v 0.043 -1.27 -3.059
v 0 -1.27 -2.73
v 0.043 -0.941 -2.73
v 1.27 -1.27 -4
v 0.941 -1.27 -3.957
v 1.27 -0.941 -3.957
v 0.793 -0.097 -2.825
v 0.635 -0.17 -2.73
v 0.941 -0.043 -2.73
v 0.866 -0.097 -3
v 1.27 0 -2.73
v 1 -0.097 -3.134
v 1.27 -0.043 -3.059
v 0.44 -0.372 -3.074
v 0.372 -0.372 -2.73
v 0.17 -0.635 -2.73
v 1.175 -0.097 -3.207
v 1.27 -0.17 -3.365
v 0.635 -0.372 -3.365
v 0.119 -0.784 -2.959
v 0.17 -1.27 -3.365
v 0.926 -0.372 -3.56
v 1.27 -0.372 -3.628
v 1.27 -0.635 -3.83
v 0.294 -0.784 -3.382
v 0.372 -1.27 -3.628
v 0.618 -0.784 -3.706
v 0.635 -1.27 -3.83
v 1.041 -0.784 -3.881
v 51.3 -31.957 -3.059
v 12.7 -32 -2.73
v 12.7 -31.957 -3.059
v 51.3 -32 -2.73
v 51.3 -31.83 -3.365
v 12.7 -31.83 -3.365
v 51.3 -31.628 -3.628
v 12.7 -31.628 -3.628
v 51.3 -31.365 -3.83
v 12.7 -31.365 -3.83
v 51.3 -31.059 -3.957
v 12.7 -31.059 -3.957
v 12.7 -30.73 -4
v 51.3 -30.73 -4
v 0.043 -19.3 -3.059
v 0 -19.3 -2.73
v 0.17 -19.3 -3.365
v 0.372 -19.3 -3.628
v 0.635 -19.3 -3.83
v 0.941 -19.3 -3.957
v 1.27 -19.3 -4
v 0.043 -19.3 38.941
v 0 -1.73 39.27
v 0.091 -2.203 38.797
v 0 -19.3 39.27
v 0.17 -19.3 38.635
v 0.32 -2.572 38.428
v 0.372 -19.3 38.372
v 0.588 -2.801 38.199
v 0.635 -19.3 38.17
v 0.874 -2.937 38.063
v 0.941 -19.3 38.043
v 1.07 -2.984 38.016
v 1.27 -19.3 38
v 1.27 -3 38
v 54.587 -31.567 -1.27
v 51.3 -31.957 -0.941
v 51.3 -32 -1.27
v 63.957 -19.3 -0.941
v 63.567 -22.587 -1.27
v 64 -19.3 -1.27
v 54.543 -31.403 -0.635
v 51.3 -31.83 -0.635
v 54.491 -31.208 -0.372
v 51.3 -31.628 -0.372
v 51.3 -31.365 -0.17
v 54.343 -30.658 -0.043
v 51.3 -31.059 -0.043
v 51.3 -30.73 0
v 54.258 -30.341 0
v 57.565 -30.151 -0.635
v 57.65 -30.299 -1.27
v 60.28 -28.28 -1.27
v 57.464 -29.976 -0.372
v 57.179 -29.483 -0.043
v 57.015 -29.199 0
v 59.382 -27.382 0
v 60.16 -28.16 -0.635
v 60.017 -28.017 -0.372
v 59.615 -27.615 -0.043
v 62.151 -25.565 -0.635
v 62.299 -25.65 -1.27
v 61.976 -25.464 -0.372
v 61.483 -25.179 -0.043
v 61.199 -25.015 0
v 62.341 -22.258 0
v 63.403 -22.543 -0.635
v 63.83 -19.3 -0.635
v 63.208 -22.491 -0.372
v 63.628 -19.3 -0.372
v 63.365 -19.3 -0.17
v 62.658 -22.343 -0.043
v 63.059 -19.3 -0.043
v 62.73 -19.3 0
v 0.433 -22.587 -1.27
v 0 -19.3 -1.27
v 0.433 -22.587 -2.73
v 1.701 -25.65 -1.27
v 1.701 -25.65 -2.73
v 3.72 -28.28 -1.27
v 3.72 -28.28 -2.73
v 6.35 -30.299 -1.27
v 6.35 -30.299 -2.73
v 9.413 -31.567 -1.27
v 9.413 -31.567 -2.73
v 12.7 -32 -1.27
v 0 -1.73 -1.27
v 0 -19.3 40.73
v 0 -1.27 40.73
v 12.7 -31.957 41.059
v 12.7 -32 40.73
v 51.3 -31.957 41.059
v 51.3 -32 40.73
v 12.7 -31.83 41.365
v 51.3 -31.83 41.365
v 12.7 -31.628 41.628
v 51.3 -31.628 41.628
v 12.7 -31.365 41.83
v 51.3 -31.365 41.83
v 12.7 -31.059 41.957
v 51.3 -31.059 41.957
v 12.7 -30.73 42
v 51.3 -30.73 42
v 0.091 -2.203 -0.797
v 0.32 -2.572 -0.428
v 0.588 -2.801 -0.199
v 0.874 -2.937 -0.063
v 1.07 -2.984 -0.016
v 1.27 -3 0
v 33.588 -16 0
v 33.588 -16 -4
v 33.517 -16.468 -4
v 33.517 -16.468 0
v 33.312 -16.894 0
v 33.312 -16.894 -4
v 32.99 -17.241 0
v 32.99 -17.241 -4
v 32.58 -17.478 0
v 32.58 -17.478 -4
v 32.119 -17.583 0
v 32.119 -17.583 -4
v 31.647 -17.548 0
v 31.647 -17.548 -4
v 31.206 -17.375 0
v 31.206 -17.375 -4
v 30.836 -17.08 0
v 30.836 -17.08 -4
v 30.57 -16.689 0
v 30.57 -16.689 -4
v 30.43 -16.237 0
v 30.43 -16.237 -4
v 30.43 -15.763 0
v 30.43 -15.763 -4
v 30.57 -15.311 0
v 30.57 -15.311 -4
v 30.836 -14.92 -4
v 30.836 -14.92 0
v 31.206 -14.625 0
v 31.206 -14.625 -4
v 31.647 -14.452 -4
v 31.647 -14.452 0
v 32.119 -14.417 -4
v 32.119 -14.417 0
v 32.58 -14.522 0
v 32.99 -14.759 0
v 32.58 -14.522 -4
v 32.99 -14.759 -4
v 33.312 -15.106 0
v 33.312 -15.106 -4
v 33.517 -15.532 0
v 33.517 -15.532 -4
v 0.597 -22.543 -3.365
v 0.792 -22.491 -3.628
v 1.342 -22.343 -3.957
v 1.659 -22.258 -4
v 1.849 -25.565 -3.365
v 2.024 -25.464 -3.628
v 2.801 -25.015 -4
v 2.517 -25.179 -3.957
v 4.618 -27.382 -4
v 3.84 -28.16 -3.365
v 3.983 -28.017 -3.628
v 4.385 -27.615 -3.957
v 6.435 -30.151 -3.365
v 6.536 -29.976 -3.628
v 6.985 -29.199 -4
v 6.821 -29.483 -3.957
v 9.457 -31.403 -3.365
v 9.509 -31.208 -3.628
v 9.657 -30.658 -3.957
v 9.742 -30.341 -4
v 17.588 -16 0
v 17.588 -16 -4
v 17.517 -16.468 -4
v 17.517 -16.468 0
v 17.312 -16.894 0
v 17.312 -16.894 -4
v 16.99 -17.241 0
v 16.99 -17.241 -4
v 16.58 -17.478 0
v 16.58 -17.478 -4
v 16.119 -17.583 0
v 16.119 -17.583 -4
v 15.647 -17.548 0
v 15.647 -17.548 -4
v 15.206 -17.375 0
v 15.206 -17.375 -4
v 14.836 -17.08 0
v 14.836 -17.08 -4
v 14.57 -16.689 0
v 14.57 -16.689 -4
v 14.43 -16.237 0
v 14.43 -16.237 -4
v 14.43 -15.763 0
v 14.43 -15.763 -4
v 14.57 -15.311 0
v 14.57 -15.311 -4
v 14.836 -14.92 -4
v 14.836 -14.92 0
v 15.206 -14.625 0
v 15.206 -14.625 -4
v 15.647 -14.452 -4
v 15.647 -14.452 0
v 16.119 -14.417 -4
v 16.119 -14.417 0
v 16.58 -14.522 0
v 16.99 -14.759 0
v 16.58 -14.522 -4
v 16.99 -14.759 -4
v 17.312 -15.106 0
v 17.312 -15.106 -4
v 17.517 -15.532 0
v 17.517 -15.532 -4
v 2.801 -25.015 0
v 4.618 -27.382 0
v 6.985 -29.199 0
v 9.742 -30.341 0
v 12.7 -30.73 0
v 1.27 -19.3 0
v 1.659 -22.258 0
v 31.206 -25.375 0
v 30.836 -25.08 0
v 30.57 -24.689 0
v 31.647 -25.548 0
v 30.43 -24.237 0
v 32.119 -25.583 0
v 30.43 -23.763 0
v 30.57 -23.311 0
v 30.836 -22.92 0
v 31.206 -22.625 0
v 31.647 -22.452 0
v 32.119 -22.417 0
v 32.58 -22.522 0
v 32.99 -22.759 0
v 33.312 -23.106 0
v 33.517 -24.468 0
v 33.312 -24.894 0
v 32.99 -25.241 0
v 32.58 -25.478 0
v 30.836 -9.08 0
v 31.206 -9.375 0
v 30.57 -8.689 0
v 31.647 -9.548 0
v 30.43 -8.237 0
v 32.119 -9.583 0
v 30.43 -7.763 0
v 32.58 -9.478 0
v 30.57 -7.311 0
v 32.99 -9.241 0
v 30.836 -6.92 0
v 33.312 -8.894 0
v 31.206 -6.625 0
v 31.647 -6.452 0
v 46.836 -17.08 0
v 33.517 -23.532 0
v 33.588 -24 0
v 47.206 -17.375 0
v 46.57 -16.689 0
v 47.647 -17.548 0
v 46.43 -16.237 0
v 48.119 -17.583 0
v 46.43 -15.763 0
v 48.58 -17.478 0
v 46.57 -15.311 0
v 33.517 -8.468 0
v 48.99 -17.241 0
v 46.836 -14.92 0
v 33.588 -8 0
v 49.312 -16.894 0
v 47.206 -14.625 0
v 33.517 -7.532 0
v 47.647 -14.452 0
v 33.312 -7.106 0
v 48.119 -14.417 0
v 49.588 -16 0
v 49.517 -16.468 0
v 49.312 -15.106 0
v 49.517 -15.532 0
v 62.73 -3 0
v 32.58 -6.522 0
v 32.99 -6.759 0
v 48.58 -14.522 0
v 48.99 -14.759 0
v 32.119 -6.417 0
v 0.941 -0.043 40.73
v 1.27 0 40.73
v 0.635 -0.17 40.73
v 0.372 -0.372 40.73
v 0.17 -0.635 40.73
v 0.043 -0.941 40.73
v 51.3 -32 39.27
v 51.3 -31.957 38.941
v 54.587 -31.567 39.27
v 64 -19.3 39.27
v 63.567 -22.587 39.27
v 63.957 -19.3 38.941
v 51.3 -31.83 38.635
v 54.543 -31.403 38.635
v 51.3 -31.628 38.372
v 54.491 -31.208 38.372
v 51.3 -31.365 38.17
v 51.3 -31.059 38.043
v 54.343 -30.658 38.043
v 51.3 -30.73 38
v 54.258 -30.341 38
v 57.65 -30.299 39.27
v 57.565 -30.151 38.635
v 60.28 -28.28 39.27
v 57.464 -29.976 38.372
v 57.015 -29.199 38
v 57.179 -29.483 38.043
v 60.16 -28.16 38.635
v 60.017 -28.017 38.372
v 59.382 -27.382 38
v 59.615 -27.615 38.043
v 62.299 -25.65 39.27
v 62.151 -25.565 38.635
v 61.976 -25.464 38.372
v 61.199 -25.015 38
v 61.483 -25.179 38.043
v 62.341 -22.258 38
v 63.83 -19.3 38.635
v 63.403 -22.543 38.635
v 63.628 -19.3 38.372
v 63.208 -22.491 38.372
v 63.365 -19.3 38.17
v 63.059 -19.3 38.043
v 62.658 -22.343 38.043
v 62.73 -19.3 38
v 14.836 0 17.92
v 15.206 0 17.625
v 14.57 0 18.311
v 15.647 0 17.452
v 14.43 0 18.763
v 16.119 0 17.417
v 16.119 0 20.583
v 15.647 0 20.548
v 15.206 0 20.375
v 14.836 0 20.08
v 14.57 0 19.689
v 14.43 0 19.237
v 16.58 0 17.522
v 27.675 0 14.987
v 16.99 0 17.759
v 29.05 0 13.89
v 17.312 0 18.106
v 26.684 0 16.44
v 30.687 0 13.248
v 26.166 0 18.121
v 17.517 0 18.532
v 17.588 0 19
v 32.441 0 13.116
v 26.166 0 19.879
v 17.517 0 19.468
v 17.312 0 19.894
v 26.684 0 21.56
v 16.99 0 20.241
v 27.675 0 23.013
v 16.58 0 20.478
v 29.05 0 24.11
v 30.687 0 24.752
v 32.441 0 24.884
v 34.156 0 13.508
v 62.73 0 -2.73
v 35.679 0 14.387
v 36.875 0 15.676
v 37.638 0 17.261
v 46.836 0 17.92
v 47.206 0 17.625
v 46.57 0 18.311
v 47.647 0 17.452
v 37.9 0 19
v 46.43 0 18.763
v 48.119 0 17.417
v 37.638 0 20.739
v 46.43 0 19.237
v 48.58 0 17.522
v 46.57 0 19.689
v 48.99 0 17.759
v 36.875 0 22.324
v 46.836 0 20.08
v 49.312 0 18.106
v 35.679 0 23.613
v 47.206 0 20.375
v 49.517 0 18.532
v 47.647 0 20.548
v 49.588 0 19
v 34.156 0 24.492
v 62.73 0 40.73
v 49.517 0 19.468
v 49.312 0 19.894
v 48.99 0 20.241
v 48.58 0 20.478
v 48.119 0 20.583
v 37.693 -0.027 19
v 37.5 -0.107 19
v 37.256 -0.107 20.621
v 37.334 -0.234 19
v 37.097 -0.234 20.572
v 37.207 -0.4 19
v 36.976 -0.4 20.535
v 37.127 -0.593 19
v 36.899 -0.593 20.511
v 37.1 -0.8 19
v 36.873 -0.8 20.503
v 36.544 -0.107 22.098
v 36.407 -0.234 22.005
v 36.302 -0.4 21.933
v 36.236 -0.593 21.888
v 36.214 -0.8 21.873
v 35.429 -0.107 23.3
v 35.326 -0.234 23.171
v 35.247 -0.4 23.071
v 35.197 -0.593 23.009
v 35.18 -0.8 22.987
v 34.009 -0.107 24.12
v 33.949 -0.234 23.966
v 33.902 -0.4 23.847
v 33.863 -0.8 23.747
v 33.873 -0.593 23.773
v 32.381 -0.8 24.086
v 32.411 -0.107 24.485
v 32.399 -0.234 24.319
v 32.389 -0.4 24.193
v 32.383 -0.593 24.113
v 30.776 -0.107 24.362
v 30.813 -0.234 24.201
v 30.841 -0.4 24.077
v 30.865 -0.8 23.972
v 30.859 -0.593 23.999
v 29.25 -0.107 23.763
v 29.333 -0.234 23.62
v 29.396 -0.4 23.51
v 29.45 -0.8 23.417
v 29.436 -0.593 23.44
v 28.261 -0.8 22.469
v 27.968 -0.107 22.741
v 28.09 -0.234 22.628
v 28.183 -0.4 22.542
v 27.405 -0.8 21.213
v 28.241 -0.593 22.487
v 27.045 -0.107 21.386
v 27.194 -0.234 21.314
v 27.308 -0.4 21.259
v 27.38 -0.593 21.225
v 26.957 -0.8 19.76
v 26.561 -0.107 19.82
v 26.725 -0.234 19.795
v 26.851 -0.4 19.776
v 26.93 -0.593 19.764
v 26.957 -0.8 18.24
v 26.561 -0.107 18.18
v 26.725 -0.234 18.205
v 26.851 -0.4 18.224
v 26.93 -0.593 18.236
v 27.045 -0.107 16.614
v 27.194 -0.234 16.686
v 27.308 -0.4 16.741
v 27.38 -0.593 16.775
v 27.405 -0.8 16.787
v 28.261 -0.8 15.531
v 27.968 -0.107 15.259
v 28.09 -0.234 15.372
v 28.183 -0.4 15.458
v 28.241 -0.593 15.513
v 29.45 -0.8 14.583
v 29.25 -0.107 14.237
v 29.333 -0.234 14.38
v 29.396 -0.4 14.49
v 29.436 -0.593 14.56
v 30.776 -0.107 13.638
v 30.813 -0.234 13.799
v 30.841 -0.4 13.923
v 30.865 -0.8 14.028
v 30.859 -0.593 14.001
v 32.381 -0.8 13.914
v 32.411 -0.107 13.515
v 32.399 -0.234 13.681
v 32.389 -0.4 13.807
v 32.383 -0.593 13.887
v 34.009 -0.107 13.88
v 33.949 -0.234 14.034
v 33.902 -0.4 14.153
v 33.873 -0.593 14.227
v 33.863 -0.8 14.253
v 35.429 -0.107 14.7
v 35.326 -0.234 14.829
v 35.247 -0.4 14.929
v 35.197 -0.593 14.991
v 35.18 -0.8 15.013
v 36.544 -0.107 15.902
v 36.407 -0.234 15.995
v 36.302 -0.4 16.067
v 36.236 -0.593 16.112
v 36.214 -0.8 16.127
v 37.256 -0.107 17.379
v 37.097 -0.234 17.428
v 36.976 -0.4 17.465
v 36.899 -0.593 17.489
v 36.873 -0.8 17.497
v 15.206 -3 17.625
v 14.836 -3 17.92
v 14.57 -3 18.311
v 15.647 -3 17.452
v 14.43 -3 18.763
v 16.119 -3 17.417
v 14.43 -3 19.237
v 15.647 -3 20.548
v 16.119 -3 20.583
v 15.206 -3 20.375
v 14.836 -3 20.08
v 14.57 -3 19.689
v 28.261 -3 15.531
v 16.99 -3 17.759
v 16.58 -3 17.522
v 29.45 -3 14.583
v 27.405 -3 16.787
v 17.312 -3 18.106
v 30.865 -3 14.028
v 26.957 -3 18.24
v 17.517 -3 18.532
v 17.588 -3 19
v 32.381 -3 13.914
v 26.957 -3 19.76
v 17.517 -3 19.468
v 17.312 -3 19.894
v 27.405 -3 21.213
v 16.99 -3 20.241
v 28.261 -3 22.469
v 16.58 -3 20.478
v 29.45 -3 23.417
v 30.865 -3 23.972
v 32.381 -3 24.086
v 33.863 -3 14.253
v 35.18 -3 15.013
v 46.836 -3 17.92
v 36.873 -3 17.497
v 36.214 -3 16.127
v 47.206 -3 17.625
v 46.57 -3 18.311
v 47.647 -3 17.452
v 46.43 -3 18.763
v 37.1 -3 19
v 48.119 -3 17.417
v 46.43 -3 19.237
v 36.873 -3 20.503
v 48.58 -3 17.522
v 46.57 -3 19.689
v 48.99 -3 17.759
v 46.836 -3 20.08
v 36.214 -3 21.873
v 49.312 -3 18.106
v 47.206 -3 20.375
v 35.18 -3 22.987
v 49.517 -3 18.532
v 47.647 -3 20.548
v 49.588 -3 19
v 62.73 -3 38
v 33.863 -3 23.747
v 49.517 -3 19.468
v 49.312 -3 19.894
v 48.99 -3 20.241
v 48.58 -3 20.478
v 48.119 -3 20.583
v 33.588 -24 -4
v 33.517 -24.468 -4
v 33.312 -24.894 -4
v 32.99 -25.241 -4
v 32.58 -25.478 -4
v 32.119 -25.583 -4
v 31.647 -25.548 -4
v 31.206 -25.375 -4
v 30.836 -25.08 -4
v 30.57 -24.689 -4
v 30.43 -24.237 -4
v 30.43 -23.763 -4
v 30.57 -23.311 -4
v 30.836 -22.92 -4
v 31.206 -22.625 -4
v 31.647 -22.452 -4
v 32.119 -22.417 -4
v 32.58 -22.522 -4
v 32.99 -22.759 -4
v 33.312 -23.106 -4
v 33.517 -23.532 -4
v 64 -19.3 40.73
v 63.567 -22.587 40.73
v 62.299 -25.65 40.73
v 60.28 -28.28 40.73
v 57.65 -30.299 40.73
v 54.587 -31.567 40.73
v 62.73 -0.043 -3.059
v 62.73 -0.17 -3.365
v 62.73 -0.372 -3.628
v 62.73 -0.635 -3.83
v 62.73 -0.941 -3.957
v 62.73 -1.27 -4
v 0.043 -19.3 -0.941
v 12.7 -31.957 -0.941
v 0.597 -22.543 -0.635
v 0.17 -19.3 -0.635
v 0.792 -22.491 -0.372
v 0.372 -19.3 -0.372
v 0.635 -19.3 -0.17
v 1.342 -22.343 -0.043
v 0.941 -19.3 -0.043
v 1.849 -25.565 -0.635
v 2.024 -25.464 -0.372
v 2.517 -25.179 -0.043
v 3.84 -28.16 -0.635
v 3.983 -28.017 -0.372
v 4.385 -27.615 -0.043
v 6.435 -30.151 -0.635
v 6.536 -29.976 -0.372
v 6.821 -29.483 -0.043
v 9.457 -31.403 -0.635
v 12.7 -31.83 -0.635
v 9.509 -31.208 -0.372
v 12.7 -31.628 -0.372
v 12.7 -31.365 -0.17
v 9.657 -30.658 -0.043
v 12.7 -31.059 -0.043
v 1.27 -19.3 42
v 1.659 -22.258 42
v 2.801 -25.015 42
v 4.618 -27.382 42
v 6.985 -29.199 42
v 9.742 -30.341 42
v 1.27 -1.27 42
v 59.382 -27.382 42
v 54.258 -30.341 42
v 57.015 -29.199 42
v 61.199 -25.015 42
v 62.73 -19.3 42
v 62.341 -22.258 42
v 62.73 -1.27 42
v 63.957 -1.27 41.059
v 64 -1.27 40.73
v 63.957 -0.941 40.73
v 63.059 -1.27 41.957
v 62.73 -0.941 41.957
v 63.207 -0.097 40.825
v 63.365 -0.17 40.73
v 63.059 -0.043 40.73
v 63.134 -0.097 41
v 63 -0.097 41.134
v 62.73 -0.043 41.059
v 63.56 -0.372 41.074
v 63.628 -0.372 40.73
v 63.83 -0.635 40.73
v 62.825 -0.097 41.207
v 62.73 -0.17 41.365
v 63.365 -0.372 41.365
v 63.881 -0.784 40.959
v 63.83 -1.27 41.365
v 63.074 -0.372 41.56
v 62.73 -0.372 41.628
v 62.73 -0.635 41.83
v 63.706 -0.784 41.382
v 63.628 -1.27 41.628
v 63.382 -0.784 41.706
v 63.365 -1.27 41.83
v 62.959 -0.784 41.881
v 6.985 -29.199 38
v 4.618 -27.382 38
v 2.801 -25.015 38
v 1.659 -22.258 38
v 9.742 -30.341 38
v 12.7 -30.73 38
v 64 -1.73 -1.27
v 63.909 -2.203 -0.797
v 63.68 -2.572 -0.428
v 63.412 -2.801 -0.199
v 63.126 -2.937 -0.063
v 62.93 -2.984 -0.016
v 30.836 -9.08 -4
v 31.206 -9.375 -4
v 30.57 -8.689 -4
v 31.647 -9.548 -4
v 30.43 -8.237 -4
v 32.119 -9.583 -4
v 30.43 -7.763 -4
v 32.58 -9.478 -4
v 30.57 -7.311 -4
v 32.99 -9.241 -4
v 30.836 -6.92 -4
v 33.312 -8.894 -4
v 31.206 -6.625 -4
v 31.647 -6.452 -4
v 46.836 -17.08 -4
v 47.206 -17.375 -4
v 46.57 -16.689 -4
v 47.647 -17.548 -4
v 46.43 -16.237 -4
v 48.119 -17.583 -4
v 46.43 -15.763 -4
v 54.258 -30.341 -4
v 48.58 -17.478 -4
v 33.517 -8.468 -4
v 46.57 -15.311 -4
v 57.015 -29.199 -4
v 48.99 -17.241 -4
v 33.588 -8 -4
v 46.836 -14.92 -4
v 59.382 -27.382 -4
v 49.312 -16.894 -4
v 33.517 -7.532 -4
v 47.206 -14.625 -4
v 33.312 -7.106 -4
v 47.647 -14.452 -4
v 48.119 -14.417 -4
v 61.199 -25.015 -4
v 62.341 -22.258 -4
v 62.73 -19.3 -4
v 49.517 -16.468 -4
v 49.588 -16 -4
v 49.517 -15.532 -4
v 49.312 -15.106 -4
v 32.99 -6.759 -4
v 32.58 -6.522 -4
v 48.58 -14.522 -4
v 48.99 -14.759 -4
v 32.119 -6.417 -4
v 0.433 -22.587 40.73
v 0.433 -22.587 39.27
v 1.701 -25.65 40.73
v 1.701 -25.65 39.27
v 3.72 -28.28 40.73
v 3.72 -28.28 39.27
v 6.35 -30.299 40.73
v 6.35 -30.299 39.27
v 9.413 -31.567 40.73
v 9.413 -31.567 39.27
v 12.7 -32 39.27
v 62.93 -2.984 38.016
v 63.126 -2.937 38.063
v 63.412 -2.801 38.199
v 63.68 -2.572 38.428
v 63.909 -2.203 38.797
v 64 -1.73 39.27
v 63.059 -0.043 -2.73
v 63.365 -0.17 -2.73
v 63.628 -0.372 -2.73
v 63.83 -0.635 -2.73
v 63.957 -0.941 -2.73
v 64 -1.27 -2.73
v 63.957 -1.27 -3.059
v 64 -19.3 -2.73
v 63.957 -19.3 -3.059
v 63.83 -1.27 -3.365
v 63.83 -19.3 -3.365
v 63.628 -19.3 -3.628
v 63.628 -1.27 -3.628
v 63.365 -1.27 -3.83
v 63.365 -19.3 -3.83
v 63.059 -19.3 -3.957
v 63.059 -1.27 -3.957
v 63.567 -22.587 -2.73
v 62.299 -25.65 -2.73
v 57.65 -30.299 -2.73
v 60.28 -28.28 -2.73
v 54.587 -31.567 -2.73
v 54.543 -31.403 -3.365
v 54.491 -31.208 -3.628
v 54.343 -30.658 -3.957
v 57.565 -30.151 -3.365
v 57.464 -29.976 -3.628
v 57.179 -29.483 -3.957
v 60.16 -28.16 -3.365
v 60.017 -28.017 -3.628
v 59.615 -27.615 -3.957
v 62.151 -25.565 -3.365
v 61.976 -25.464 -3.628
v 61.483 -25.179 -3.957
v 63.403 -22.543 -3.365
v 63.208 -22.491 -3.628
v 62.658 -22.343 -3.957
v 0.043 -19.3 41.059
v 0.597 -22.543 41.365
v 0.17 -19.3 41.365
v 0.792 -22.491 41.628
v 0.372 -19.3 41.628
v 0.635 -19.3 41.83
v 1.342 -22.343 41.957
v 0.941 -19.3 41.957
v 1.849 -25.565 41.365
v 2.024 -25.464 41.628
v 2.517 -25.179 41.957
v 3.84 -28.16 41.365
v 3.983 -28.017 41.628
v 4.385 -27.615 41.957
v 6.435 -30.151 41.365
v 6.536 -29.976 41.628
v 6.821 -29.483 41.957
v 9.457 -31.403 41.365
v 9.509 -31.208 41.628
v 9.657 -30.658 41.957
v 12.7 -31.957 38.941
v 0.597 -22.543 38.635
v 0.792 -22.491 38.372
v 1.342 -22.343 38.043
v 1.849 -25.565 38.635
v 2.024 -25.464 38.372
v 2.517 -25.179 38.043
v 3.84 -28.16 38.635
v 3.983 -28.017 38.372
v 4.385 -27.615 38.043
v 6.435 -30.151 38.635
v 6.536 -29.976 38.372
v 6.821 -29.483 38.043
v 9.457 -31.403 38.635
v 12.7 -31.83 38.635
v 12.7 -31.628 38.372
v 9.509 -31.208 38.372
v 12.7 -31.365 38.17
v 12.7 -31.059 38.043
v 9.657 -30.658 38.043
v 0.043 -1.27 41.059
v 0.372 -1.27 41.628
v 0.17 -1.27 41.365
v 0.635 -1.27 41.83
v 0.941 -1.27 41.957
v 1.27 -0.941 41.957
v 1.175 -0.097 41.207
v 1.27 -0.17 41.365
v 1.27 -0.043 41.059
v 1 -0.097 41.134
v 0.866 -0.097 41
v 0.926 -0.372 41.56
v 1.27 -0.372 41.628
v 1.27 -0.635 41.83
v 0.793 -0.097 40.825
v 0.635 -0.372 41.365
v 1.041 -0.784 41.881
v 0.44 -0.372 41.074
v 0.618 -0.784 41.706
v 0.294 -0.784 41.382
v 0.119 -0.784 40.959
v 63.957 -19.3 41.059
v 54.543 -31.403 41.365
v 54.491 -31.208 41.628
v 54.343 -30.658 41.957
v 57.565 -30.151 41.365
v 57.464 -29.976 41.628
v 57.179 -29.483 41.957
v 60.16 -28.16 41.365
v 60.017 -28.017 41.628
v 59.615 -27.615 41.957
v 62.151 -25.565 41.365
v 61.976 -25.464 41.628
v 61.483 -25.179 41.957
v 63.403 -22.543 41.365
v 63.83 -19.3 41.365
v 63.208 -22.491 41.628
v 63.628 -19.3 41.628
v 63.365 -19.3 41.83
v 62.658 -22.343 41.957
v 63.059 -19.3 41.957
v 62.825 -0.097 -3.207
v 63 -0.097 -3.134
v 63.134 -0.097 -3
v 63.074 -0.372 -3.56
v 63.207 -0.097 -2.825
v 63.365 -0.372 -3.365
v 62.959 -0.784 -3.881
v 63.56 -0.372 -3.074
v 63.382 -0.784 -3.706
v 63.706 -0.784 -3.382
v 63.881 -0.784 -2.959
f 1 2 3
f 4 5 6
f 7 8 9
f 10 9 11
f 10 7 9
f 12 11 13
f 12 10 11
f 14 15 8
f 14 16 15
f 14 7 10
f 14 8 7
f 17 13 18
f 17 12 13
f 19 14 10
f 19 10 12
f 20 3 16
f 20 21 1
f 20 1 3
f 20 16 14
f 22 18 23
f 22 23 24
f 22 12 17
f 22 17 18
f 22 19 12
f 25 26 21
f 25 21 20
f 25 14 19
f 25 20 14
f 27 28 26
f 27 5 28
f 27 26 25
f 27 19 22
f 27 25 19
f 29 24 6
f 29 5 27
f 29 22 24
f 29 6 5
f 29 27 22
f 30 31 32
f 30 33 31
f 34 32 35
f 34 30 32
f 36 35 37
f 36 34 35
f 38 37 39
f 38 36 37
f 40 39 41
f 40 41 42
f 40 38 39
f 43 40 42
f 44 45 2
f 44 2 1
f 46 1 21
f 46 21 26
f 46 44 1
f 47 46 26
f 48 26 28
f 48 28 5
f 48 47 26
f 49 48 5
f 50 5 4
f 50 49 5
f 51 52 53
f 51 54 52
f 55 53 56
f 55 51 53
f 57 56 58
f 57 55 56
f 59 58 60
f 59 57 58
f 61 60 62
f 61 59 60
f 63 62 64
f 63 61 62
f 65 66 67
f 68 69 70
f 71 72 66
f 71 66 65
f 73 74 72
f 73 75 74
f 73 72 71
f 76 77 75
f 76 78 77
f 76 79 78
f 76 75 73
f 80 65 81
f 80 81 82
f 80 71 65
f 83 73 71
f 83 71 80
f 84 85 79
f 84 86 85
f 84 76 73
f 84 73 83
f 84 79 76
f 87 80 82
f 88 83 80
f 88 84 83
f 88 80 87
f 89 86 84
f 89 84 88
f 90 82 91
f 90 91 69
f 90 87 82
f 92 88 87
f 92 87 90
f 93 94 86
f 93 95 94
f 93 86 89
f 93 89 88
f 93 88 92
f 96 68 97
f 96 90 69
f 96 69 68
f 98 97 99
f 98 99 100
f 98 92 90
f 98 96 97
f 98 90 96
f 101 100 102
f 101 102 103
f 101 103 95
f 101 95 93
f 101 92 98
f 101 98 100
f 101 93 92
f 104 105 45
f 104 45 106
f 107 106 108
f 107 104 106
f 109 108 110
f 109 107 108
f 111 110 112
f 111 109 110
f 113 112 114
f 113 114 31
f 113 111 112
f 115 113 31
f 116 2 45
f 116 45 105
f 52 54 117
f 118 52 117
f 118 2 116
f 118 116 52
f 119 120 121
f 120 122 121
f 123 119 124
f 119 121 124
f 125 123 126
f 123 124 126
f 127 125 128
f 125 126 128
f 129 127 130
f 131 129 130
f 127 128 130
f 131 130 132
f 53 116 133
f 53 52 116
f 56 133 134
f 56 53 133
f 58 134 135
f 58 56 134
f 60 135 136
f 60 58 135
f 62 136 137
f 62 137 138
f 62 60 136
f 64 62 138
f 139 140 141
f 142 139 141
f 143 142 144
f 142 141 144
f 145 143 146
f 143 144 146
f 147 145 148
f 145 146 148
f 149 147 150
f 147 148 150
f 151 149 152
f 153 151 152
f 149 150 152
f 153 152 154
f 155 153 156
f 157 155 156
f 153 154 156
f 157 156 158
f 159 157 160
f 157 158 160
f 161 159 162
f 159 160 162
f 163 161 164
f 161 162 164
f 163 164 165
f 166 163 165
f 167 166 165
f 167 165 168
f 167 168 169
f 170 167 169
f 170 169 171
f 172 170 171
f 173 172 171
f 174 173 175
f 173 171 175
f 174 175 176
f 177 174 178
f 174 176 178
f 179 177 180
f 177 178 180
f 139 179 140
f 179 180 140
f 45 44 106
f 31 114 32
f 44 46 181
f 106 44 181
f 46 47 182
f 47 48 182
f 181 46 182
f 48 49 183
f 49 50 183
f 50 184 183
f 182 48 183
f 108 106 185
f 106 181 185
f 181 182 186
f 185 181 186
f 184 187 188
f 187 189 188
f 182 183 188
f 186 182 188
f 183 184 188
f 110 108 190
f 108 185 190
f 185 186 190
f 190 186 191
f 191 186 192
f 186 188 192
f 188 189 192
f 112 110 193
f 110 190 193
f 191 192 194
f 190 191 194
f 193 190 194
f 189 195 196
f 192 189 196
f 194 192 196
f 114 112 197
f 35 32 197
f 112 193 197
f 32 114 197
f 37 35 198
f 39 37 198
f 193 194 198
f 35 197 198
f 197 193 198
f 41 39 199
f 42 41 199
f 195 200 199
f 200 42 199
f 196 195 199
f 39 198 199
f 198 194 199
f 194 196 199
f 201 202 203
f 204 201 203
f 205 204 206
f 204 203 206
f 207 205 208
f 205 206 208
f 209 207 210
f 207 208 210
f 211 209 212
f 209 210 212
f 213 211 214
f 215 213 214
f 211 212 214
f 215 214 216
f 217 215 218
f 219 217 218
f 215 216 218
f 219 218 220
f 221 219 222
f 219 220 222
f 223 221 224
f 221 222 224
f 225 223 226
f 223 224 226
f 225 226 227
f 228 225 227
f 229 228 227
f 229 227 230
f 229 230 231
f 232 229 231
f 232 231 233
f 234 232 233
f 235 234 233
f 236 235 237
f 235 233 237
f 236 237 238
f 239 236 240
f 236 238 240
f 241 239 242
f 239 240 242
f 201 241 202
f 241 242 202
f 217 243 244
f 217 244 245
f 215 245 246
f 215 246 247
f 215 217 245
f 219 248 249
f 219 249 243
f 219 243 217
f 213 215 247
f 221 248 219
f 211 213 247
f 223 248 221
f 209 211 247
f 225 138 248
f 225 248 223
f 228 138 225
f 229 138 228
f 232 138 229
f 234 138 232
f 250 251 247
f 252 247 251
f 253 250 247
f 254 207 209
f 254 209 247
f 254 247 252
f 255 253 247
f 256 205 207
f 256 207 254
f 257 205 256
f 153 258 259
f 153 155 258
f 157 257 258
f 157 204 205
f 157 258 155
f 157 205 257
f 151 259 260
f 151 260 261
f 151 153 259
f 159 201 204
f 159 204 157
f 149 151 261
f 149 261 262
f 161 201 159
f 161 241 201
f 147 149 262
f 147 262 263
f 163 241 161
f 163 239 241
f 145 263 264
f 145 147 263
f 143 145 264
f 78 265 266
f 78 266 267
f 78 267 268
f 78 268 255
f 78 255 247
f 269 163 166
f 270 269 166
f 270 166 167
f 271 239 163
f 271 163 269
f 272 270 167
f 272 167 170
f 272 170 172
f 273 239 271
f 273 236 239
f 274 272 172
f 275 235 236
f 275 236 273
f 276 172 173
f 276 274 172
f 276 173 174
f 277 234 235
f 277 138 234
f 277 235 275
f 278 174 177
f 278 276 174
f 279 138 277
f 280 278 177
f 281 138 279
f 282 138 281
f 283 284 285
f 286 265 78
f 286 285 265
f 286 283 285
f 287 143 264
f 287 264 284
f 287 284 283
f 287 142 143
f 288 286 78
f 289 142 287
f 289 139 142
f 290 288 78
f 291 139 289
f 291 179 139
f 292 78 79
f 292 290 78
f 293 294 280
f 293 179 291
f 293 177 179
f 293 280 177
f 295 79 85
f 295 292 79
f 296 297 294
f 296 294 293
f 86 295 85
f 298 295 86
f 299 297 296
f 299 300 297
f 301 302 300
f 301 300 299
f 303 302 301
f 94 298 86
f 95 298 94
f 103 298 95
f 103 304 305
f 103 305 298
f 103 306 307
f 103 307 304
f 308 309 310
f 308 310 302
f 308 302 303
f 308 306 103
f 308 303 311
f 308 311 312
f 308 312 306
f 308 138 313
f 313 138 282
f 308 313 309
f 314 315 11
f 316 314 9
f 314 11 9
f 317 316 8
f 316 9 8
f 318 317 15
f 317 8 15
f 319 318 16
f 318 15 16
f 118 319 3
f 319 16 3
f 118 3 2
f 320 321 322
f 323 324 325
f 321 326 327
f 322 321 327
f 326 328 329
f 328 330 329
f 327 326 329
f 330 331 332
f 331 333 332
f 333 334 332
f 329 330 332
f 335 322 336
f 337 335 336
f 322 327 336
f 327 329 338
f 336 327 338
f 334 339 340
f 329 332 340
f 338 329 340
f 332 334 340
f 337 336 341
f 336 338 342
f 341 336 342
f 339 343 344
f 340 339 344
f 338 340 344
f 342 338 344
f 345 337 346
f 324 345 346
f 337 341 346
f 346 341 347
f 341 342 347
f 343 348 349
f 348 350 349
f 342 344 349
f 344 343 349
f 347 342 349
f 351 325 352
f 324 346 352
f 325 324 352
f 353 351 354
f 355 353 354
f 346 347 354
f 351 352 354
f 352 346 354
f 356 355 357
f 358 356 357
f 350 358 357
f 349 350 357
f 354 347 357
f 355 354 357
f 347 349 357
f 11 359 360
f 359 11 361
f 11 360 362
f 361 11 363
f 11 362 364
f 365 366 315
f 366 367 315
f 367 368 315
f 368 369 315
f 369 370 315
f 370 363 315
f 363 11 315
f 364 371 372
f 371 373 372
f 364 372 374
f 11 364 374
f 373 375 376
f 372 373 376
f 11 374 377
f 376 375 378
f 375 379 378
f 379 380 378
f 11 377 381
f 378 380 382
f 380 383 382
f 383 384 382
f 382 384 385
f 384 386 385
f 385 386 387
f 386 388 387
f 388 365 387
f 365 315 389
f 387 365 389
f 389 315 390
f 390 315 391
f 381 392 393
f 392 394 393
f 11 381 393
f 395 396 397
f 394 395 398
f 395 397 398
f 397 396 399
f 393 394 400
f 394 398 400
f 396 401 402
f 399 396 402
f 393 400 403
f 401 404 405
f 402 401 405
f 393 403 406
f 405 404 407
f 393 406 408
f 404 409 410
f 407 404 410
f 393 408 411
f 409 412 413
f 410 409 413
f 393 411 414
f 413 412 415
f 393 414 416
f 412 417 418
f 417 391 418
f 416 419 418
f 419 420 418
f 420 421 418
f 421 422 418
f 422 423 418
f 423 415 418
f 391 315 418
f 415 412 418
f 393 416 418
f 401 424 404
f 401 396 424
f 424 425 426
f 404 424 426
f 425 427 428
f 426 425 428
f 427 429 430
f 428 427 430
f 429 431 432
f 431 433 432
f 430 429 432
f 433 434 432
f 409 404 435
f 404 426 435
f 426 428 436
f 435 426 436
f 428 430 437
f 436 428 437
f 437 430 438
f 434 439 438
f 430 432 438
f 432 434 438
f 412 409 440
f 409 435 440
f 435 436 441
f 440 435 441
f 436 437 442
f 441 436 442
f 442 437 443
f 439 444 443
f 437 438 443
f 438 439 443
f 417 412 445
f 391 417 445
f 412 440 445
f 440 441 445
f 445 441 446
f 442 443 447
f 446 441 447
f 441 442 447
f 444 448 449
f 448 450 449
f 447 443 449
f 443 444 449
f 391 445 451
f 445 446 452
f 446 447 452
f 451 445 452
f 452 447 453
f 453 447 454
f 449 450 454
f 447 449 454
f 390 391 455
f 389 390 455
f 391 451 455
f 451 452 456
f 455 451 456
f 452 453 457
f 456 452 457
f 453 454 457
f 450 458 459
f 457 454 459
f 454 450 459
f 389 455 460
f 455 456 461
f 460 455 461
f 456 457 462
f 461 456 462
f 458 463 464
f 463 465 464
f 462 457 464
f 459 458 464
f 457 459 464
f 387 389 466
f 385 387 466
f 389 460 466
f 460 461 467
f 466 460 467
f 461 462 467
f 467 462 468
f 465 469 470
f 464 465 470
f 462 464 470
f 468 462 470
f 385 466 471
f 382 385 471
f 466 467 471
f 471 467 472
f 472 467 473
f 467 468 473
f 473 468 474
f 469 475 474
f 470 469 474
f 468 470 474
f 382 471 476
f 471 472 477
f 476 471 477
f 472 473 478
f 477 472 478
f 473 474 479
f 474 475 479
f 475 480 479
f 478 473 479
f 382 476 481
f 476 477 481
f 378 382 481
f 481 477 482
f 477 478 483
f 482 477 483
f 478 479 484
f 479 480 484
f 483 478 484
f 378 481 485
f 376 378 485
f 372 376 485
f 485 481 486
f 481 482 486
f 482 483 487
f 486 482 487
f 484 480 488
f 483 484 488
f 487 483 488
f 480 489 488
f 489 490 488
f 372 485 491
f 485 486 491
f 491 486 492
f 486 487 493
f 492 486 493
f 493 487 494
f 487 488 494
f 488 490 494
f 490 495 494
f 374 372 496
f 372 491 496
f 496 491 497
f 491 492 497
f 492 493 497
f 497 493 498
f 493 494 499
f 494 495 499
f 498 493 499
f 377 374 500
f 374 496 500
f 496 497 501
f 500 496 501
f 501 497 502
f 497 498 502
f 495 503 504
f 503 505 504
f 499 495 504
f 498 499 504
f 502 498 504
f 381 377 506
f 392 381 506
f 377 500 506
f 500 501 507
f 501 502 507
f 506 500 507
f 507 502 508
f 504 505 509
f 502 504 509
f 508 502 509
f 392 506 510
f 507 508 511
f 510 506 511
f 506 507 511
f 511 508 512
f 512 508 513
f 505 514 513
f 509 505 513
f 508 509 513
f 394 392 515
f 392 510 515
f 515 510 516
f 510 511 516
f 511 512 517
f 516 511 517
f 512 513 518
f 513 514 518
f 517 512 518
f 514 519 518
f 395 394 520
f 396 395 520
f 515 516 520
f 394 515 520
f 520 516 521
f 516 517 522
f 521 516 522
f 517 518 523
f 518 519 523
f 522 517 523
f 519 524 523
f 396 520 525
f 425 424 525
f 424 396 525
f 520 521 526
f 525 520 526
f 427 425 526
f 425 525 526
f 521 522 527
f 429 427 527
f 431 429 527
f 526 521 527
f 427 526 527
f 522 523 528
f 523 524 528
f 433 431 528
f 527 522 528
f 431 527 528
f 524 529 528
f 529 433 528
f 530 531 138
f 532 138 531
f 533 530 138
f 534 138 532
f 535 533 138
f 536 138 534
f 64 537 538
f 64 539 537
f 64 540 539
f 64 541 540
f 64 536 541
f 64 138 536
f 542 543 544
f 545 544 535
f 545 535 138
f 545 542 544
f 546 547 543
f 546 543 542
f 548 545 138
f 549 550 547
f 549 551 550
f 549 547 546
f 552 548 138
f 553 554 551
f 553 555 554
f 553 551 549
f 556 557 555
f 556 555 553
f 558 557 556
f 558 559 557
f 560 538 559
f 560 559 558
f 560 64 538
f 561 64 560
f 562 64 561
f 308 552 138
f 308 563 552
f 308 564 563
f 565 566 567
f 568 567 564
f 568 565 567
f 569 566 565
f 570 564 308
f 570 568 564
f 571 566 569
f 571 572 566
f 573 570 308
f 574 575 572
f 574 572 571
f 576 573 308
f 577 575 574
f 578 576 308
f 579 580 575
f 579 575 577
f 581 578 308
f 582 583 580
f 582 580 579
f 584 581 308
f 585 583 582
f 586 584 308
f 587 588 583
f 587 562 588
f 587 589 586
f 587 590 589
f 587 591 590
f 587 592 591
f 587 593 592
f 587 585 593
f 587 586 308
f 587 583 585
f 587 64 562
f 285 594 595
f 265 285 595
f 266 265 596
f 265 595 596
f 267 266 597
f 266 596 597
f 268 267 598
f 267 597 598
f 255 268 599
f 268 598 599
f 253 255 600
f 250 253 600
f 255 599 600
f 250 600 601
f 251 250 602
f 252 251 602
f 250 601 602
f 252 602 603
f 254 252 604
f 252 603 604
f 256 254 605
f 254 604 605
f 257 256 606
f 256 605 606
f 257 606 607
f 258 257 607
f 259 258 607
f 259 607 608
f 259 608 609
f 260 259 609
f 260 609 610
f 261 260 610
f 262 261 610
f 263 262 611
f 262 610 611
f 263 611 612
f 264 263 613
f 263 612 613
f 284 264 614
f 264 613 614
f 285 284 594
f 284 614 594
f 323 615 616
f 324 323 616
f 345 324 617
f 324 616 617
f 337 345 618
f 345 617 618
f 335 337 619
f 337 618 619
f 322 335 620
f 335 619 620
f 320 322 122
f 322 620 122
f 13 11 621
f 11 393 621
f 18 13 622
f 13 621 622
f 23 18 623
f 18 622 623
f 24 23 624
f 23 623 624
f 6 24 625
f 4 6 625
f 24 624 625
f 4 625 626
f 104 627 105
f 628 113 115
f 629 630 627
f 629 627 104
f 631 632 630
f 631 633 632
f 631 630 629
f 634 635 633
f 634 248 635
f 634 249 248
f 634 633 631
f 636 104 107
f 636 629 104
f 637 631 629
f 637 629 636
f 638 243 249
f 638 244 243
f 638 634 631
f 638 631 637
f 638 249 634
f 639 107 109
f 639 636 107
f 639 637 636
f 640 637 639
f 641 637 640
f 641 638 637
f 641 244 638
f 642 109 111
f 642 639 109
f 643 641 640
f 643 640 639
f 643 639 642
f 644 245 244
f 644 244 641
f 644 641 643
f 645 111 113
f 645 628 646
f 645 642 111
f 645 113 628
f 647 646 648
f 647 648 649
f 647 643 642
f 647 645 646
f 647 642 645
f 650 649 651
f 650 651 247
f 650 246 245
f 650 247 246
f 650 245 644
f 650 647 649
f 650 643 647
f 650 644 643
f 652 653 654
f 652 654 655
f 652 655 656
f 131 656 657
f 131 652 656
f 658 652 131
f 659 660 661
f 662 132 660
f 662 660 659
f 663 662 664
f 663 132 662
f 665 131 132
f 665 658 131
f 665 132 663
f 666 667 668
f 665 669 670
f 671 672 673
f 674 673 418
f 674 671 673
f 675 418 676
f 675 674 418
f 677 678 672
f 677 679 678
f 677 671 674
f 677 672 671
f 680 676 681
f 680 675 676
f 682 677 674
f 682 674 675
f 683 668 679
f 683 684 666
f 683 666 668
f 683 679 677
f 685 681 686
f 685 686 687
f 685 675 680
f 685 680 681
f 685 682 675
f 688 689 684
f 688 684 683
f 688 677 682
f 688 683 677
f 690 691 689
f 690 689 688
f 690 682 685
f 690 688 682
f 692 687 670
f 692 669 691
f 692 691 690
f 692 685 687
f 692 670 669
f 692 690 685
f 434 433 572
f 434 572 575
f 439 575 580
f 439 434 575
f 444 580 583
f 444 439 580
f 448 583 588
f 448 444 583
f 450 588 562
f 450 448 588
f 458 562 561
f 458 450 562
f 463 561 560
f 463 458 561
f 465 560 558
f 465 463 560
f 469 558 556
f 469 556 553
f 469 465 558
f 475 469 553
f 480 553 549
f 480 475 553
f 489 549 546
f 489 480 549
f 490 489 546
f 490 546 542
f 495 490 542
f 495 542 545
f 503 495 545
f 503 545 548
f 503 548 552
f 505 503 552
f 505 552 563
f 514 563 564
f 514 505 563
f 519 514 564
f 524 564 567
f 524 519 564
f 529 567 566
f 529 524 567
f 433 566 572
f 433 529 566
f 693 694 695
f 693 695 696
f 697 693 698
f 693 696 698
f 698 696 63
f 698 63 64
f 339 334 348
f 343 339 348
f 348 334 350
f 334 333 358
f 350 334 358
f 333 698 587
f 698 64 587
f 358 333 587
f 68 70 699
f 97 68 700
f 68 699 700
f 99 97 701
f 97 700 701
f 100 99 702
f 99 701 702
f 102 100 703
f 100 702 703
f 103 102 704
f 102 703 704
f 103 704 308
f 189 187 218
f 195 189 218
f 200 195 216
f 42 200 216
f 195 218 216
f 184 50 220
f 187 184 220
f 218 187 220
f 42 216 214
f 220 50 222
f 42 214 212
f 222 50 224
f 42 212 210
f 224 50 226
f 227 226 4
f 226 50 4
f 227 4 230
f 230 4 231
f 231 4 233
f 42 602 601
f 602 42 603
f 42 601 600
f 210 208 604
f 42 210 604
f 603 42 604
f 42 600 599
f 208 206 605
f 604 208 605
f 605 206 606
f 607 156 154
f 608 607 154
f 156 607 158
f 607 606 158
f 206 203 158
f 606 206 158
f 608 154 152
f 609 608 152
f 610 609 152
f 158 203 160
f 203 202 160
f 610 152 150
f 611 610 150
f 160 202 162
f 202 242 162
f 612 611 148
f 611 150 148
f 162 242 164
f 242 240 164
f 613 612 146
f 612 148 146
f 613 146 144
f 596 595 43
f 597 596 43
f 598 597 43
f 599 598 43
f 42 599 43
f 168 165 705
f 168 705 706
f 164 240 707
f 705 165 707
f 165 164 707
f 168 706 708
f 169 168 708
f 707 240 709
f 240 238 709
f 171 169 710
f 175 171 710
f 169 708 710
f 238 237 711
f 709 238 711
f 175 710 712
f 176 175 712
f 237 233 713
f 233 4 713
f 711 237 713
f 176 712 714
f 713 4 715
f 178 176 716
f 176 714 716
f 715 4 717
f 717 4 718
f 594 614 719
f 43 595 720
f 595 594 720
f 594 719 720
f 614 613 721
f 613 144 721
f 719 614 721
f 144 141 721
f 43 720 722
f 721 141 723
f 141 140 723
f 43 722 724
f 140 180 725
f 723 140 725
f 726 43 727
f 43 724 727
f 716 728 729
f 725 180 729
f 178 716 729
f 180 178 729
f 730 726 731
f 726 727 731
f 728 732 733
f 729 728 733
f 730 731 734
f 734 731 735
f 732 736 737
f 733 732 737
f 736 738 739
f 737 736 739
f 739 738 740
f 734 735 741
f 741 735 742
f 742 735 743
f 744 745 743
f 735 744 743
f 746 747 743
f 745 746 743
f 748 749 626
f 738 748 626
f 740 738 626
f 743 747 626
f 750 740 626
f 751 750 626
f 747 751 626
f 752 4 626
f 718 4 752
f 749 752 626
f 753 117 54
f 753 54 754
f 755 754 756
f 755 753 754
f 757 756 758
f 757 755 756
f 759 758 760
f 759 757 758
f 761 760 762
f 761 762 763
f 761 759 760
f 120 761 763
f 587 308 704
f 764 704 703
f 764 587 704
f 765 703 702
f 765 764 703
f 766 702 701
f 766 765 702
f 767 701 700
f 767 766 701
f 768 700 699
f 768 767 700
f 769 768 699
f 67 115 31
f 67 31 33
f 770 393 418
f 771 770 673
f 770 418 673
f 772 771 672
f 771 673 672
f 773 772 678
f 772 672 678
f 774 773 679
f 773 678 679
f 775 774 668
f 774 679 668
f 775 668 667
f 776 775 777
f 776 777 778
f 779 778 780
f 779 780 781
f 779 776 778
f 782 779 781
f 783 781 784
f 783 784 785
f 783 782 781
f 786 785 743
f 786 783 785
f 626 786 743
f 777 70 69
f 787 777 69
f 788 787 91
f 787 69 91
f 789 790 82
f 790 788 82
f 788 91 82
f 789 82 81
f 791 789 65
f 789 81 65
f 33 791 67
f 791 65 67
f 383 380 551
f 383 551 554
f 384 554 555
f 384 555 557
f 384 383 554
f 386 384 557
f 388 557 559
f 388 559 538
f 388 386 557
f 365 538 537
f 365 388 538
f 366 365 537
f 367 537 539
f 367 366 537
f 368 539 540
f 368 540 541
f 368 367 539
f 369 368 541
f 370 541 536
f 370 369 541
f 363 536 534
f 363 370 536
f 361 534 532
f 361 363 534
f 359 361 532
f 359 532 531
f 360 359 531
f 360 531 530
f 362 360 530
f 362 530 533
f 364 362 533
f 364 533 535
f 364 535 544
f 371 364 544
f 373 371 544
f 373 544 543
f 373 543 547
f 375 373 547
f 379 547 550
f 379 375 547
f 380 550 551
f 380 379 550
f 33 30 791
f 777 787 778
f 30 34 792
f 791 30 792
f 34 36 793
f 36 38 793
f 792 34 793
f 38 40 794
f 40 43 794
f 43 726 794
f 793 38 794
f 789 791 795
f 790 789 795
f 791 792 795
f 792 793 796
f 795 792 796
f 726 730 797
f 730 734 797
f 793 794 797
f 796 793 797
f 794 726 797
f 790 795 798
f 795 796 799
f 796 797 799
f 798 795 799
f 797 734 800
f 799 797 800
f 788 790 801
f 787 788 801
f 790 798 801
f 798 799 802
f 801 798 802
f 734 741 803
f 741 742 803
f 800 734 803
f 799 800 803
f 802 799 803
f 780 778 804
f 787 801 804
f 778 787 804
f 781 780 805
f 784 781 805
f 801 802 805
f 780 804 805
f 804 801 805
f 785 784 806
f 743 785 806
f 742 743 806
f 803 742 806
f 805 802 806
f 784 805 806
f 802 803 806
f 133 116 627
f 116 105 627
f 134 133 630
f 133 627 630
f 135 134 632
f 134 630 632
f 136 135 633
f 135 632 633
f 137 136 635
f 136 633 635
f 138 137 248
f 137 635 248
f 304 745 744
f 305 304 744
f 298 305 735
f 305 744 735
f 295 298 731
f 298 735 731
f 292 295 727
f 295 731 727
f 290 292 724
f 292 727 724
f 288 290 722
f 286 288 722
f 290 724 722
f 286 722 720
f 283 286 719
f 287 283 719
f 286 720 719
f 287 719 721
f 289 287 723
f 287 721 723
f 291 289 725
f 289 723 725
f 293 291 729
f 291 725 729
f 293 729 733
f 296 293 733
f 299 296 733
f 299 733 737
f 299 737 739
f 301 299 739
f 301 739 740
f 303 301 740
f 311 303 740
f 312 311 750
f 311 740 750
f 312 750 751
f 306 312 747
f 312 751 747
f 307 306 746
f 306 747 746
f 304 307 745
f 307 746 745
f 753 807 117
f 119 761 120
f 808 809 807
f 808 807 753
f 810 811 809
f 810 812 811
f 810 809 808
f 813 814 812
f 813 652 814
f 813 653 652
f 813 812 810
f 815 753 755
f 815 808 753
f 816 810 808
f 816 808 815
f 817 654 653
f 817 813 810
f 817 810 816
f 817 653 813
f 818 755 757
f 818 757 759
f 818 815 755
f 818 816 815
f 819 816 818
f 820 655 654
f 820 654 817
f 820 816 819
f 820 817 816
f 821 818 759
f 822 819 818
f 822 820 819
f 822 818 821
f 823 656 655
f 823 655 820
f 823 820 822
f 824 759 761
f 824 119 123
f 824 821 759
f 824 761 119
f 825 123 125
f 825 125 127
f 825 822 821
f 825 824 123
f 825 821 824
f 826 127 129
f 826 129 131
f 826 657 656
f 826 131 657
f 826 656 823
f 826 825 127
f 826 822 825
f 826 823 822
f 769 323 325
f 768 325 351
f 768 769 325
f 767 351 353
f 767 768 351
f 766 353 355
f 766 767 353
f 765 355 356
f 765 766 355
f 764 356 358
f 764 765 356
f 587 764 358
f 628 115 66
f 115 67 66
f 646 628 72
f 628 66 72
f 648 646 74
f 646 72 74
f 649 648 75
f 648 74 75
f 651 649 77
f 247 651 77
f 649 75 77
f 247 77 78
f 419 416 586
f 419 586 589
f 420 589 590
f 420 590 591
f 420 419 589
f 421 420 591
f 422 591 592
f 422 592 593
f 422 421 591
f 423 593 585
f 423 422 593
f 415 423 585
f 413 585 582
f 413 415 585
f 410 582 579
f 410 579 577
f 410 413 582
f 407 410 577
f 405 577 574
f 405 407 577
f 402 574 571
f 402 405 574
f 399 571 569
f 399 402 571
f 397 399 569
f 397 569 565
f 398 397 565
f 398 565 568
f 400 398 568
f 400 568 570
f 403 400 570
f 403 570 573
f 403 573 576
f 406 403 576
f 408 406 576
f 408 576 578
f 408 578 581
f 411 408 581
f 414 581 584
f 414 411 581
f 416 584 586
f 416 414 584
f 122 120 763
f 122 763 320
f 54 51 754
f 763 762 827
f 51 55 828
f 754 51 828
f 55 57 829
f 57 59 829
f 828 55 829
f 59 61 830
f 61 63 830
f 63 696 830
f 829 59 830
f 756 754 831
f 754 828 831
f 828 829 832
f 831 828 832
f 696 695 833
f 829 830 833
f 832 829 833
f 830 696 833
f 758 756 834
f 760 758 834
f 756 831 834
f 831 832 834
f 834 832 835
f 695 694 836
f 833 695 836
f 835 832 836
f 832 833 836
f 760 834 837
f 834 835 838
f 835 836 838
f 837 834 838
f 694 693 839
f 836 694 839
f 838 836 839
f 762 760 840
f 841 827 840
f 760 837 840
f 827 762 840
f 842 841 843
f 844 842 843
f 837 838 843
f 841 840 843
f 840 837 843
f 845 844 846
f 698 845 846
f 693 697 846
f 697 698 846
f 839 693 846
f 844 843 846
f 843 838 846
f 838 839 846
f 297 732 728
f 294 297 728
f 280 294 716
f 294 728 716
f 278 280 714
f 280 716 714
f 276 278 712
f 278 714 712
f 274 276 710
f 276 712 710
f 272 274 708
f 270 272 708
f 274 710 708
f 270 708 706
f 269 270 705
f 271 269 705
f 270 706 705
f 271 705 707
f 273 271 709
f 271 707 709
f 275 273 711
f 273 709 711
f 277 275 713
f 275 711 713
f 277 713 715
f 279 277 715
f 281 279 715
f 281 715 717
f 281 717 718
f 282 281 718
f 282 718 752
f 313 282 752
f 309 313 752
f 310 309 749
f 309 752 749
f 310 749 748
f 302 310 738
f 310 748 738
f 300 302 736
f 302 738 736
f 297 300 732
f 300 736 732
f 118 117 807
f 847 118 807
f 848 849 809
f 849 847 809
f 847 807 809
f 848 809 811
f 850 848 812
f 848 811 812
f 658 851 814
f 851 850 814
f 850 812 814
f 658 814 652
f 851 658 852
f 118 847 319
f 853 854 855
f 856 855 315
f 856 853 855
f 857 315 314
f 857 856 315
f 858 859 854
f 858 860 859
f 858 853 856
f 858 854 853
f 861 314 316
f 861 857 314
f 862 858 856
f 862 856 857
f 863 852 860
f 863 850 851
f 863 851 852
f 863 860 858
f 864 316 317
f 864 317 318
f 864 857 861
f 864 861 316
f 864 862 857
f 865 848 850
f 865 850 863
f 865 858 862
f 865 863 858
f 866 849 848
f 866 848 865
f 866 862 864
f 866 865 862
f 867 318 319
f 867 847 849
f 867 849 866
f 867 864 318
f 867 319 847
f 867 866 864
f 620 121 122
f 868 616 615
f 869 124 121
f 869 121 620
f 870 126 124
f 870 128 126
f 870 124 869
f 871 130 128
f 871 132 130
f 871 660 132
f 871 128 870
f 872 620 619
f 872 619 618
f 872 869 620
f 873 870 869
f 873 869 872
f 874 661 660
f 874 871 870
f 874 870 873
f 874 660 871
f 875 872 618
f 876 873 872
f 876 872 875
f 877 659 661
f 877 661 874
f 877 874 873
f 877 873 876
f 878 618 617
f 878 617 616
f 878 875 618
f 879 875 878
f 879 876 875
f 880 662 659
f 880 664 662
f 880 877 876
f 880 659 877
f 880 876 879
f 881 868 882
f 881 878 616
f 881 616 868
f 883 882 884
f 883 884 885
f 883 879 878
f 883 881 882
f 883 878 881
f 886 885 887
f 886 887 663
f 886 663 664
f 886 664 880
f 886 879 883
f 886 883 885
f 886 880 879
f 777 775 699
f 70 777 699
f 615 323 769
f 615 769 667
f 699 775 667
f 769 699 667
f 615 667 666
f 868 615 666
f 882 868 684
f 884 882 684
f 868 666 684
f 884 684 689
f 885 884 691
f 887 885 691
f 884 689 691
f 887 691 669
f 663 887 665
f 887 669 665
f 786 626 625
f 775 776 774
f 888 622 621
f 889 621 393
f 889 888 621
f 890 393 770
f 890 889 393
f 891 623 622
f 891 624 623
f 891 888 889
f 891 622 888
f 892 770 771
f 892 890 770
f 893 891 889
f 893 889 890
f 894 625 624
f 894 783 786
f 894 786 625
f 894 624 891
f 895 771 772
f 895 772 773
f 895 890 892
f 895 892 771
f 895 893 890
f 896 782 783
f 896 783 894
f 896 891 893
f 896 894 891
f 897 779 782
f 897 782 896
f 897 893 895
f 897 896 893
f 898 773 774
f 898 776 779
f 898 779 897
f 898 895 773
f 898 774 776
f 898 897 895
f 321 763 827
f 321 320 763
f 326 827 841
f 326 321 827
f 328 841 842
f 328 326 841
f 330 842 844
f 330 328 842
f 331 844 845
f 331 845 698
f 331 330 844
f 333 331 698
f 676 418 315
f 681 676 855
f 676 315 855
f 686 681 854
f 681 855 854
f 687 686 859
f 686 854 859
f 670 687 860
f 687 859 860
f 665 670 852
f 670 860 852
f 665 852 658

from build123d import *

# Parameters (mm, degrees)
F0_W     = 64
F0_H     = 38
F0_R     = 1.5875
F0_R_2   = 5.1
F1_DEPTH = 3
F0_H_2   = 4
F2_DEPTH = 32
F3_R     = 12.7
F4_R     = 1.5875
F5_DEPTH = 4
F6_R     = 1.27
F7_R     = 0.8
F8_R     = 1.27


with BuildPart() as f1:
    # F0 (on Front) → F1 (new body)
    with BuildSketch(Plane.XZ):
        with Locations((32, 19)):
            Rectangle(F0_W, F0_H)
        with Locations((16, 19)):
            Circle(F0_R, mode=Mode.SUBTRACT)
        with Locations((32, 19)):
            Circle(F0_R_2, mode=Mode.SUBTRACT)
        with Locations((48, 19)):
            Circle(F0_R, mode=Mode.SUBTRACT)
    extrude(amount=F1_DEPTH)

    # F0 (on Front) → F2 (join)
    with BuildSketch(Plane.XZ):
        with Locations((32, 40)):
            Rectangle(F0_W, F0_H_2)
        with Locations((32, -2)):
            Rectangle(F0_W, F0_H_2)
    extrude(amount=F2_DEPTH)

    # F3
    f3_edges = [f1.edges().sort_by_distance(p)[0] for p in [
        (64, -32, -2),
        (64, -32, 40),
        (0, -32, -2),
        (0, -32, 40),
    ]]
    fillet(f3_edges, radius=F3_R)

    # F4 (on face) → F5 (cut, through all)
    with BuildSketch(Plane(origin=(0, 0, -4), x_dir=(1, 0, 0), z_dir=(0, 0, -1))):
        with Locations((48, 16)):
            Circle(F4_R)
        with Locations((32, 24)):
            Circle(F4_R)
        with Locations((32, 16)):
            Circle(F4_R)
        with Locations((32, 8)):
            Circle(F4_R)
        with Locations((16, 16)):
            Circle(F4_R)
    extrude(amount=-F5_DEPTH, mode=Mode.SUBTRACT)

    # F6
    f6_edges = [f1.edges().sort_by_distance(p)[0] for p in [
        (0, -11.15, 38),
        (0, -9.65, 42),
        (0, -9.65, -4),
        (0, -11.15, 0),
        (0, -3, 19),
        (64, -3, 19),
    ]]
    fillet(f6_edges, radius=F6_R)

    # F7
    f7_edges = [f1.edges().sort_by_distance(p)[0] for p in [
        (26.9, 0, 19),
    ]]
    fillet(f7_edges, radius=F7_R)

    # F8
    f8_edges = [f1.edges().sort_by_distance(p)[0] for p in [
        (32, 0, -4),
        (32, 0, 42),
    ]]
    fillet(f8_edges, radius=F8_R)


solid = f1.part
